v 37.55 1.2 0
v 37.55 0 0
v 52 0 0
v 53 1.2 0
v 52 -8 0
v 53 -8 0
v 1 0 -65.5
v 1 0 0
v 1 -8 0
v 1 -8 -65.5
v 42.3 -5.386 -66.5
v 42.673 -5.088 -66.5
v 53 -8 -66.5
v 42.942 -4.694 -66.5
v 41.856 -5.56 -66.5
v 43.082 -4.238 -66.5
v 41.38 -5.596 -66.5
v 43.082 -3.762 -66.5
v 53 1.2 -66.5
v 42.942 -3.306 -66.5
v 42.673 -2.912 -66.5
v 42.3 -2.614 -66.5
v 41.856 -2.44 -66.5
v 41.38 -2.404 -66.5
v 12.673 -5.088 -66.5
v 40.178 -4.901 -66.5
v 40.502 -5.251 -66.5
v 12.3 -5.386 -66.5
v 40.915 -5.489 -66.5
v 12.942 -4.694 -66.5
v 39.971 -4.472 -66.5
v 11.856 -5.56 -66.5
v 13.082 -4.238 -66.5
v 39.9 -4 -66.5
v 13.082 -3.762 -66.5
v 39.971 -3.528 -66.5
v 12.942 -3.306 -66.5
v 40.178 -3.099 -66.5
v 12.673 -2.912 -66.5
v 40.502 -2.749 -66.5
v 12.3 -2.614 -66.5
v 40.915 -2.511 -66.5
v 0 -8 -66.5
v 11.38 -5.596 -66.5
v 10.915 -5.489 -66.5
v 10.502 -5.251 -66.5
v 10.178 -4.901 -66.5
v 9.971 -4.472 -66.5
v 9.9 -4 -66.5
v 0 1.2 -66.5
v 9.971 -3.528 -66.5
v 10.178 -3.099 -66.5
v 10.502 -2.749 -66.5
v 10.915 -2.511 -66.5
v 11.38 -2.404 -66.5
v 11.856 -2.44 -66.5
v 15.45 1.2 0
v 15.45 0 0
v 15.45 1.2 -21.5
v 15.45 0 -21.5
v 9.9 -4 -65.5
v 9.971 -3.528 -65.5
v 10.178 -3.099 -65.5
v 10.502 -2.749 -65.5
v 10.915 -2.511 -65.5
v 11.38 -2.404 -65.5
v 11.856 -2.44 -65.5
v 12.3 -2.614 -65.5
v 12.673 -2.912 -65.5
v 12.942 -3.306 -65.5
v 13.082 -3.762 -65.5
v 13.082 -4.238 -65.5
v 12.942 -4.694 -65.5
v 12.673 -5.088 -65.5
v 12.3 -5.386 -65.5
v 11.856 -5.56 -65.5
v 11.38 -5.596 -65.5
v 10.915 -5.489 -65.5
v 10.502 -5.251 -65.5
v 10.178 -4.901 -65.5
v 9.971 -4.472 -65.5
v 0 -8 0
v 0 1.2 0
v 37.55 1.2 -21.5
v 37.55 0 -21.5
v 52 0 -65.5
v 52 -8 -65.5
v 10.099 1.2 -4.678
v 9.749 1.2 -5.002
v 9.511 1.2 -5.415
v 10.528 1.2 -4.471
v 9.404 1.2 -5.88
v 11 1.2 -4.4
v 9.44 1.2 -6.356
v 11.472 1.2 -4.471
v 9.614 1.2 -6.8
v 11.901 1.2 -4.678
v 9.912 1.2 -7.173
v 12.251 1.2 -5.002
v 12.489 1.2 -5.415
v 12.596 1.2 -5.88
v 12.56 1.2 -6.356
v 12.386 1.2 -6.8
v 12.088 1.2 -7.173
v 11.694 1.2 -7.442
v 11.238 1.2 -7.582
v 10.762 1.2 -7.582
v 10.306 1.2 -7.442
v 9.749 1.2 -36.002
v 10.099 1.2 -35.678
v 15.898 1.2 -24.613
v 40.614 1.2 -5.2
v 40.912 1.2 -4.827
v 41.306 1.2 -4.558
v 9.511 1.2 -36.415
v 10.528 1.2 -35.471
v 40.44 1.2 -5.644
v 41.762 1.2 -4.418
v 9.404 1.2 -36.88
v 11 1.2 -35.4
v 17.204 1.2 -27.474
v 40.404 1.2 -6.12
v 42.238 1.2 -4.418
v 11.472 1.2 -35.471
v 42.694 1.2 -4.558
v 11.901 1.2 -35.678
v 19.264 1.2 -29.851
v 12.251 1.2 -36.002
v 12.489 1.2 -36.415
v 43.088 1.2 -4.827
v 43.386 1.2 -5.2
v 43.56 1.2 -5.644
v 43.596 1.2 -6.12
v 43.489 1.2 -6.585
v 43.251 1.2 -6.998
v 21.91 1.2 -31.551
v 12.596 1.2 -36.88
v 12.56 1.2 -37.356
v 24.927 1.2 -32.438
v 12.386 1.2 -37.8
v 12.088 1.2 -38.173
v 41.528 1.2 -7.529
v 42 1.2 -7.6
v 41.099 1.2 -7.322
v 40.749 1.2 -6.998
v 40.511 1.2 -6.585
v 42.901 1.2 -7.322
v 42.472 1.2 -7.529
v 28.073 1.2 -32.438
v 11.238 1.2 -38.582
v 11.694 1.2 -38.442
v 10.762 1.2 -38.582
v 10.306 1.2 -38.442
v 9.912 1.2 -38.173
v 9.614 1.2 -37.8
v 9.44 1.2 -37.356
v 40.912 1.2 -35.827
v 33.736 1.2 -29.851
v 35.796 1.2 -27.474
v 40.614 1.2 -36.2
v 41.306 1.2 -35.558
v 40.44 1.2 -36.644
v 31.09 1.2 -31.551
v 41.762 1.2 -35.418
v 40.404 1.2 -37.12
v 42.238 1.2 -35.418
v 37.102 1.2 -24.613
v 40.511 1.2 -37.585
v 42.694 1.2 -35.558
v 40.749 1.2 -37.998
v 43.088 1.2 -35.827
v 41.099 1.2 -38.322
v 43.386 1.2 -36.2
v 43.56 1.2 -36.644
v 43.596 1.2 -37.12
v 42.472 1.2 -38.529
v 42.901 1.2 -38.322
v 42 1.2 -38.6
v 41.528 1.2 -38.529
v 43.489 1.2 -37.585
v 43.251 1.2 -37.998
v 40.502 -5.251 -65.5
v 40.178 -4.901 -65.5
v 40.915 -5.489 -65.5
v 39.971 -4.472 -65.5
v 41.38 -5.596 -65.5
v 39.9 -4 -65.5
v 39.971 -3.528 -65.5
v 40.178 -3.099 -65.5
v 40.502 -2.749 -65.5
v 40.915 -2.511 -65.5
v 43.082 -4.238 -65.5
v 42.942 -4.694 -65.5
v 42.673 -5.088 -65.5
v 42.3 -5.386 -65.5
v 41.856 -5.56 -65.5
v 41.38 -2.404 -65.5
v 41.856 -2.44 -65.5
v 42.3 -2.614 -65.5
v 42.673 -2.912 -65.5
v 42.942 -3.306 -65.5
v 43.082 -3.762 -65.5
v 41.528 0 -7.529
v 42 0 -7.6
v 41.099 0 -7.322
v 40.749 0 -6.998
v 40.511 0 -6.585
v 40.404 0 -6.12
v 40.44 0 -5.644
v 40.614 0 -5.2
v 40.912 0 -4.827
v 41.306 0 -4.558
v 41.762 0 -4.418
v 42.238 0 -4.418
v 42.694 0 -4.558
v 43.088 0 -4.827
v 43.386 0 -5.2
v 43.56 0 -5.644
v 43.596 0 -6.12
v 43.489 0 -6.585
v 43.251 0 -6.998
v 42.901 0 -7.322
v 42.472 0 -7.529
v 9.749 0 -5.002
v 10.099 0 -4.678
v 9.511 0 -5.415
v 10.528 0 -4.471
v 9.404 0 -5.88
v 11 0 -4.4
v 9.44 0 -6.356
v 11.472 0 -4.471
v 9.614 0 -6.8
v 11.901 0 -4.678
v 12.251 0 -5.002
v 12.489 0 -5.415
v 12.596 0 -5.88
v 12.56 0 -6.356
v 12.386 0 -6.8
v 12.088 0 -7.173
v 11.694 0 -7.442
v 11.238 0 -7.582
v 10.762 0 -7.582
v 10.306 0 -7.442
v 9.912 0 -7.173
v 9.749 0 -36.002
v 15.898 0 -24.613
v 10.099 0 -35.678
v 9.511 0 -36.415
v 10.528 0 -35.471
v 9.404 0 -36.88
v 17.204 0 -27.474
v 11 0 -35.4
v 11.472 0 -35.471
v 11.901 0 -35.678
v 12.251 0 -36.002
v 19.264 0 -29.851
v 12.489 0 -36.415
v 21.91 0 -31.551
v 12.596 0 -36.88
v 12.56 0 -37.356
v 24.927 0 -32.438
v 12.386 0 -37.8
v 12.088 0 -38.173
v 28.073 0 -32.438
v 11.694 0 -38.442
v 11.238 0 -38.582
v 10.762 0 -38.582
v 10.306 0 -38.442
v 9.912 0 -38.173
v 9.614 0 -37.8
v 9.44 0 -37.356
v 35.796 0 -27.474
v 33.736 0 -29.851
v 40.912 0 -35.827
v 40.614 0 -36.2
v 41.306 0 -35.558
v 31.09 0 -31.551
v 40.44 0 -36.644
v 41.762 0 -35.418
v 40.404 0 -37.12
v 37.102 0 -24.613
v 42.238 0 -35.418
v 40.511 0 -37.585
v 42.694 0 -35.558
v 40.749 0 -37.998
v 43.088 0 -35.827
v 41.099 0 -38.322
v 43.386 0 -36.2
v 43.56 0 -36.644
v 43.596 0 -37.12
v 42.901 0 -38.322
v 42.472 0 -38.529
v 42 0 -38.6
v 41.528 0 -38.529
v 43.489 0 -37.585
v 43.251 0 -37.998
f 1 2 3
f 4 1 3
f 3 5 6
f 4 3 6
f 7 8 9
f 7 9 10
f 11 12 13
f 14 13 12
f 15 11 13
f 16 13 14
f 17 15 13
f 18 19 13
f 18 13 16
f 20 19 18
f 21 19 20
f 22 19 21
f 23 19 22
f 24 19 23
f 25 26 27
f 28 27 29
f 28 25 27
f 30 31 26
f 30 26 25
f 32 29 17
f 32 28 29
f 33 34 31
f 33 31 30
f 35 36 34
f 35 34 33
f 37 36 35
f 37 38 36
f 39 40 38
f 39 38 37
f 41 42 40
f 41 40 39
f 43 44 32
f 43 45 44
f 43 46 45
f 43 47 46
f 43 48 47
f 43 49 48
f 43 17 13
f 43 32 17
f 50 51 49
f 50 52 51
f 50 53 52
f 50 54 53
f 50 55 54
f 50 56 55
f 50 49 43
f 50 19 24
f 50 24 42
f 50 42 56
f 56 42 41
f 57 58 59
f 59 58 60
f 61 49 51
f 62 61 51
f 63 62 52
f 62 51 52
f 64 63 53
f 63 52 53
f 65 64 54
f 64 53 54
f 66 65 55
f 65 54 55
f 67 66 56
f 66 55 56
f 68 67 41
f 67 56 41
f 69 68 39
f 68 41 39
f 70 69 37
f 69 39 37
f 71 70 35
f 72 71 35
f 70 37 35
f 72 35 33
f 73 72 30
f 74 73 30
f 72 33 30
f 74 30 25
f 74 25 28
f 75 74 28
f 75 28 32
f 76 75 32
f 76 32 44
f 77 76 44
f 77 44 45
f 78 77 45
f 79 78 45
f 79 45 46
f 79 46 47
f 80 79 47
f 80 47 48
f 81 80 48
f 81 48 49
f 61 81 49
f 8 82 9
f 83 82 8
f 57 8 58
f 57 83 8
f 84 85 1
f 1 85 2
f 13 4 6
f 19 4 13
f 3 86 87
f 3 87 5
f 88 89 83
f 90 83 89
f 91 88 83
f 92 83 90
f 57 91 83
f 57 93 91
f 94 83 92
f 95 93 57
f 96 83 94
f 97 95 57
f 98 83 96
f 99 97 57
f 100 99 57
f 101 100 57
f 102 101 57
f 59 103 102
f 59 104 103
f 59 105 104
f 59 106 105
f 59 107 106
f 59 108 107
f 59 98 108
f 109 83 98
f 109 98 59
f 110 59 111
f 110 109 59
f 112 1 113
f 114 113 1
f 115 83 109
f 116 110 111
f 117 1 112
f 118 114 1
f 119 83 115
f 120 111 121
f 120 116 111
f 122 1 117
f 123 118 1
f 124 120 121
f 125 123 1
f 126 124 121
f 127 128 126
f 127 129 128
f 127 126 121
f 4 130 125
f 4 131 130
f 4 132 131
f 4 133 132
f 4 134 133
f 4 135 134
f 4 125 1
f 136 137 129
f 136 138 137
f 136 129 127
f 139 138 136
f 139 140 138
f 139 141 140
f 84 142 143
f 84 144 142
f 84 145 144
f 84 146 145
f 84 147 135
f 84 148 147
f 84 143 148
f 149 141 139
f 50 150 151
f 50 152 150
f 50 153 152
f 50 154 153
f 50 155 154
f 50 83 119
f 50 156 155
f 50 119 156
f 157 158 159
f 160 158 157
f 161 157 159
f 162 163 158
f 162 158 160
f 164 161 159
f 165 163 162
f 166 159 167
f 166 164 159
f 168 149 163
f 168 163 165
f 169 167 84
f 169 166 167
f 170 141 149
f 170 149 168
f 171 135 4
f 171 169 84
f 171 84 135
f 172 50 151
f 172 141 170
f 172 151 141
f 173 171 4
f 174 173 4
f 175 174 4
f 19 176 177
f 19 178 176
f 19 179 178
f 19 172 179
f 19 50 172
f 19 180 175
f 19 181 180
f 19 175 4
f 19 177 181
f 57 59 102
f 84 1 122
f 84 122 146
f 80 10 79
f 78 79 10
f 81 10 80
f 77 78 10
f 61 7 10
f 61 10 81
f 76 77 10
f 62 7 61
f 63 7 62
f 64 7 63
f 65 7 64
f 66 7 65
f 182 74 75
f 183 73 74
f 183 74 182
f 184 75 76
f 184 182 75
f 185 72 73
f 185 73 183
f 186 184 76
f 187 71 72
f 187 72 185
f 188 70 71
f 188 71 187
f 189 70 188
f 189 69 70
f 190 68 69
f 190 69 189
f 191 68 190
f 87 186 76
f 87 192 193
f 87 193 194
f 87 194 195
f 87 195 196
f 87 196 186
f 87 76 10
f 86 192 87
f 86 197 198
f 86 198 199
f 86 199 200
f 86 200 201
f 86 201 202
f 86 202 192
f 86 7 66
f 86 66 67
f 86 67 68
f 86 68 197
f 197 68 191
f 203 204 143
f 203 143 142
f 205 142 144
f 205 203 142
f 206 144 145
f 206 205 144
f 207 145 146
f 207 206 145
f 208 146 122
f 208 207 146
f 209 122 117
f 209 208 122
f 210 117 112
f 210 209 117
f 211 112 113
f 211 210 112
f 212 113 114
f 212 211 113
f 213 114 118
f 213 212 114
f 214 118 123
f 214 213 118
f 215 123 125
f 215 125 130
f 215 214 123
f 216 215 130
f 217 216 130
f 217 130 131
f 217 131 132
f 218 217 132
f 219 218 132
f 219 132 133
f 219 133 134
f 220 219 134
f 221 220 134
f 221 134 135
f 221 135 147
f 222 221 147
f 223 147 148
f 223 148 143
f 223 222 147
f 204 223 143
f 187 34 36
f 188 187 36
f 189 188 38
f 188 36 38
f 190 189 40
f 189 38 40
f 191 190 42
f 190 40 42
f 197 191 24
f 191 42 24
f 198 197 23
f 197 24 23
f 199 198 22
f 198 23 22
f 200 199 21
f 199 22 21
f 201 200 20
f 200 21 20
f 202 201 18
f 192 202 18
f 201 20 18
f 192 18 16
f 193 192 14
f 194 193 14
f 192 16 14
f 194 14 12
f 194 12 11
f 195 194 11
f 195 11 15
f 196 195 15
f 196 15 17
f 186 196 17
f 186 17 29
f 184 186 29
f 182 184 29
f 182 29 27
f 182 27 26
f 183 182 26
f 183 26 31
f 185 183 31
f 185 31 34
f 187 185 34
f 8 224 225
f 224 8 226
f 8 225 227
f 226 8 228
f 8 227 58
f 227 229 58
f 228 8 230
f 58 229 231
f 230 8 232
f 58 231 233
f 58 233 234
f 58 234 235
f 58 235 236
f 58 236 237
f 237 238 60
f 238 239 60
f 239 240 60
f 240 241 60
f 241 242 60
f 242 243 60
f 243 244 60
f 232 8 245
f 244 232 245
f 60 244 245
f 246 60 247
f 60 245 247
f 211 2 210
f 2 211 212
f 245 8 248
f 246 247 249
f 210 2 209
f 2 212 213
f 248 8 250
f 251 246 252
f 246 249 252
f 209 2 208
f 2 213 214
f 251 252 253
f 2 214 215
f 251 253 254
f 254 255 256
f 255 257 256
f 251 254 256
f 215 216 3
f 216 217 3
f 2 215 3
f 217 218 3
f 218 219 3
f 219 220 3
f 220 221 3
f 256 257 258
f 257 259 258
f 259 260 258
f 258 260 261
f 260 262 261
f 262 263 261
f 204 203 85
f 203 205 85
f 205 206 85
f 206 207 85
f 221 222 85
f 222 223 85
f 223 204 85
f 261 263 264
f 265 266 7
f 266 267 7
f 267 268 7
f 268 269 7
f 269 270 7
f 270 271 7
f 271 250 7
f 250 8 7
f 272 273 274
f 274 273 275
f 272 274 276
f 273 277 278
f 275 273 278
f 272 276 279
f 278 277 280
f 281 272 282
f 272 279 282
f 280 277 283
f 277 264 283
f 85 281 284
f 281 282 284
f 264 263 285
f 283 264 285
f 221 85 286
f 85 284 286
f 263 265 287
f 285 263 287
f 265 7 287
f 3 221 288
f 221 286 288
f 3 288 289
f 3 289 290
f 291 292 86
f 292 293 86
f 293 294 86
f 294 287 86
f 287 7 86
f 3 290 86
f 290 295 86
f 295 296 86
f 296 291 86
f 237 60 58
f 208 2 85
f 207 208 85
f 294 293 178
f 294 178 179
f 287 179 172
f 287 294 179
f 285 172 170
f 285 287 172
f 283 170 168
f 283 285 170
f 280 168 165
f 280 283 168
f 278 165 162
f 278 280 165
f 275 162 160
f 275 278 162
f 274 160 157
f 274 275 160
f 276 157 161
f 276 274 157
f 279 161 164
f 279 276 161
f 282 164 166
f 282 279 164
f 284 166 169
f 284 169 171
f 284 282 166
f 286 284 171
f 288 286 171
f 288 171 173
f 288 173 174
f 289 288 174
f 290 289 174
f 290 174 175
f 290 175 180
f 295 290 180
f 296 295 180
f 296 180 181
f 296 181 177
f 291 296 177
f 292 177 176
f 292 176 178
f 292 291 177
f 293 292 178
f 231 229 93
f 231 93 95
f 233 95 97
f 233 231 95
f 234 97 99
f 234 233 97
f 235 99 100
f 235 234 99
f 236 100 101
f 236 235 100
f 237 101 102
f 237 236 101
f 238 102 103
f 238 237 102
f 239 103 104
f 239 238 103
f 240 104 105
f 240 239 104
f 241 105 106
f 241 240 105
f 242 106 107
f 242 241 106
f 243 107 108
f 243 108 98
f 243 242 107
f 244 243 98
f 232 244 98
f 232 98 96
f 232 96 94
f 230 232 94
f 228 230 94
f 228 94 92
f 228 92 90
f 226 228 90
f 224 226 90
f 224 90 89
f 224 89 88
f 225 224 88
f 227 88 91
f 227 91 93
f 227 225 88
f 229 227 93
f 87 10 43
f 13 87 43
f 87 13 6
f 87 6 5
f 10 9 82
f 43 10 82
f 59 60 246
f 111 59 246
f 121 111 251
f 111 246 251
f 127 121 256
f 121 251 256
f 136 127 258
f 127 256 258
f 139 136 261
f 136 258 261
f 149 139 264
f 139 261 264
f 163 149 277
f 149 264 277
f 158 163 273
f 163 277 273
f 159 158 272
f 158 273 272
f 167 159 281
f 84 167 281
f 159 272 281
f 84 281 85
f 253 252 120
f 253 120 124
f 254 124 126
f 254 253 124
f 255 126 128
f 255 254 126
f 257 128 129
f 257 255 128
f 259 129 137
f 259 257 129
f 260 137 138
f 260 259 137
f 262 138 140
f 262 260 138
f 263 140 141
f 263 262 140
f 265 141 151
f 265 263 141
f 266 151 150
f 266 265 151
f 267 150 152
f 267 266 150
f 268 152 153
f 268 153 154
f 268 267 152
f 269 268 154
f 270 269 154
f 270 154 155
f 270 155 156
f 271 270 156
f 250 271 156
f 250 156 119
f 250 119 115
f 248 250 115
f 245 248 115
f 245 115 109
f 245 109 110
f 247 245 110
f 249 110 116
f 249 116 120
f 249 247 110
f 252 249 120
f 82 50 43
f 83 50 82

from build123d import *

# Parameters (mm, degrees)
SKETCH_1_R          = 1.6
EXTRUDE_1_DEPTH     = 1.2
EXTRUDE_2_DEPTH     = 8
SKETCH_3_R          = 1.6
CUT_EXTRUDE_1_DEPTH = 8


with BuildPart() as part:
    # 草图1 → 凸台-拉伸1 (new body)
    with BuildSketch(Plane(origin=(0, 0, 0), x_dir=(1, 0, 0), z_dir=(0, 1, 0))):
        with BuildLine():
            Line((15.45, 0), (15.45, 21.5))
            ThreePointArc((15.45, 21.5), (26.5, 32.55), (37.55, 21.5))
            Line((37.55, 21.5), (37.55, 0))
            Line((37.55, 0), (53, 0))
            Line((53, 0), (53, 66.5))
            Line((53, 66.5), (0, 66.5))
            Line((0, 66.5), (0, 0))
            Line((0, 0), (15.45, 0))
        make_face()
        with Locations(Location((11, 6, 0), (0, 0, 270))):
            Circle(SKETCH_1_R, mode=Mode.SUBTRACT)
        with Locations(Location((11, 37, 0), (0, 0, 270))):
            Circle(SKETCH_1_R, mode=Mode.SUBTRACT)
        with Locations(Location((42, 37, 0), (0, 0, 90))):
            Circle(SKETCH_1_R, mode=Mode.SUBTRACT)
        with Locations(Location((42, 6, 0), (0, 0, 90))):
            Circle(SKETCH_1_R, mode=Mode.SUBTRACT)
    extrude(amount=EXTRUDE_1_DEPTH)

    # 草图2 → 凸台-拉伸2 (add)
    with BuildSketch(Plane.XZ):
        Polygon((1, 0), (1, -65.5), (52, -65.5), (52, 0), (53, 0), (53, -66.5), (0, -66.5), (0, 0), align=None)
    extrude(amount=EXTRUDE_2_DEPTH)

    # 草图3 → 切除-拉伸1 (cut)
    with BuildSketch(Plane(origin=(0, 0, -66.5), x_dir=(-1, 0, 0), z_dir=(0, 0, -1))):
        with Locations((-11.5, -4)):
            Circle(SKETCH_3_R)
        with Locations((-41.5, -4)):
            Circle(SKETCH_3_R)
    extrude(amount=-CUT_EXTRUDE_1_DEPTH, mode=Mode.SUBTRACT)


solid = part.part
